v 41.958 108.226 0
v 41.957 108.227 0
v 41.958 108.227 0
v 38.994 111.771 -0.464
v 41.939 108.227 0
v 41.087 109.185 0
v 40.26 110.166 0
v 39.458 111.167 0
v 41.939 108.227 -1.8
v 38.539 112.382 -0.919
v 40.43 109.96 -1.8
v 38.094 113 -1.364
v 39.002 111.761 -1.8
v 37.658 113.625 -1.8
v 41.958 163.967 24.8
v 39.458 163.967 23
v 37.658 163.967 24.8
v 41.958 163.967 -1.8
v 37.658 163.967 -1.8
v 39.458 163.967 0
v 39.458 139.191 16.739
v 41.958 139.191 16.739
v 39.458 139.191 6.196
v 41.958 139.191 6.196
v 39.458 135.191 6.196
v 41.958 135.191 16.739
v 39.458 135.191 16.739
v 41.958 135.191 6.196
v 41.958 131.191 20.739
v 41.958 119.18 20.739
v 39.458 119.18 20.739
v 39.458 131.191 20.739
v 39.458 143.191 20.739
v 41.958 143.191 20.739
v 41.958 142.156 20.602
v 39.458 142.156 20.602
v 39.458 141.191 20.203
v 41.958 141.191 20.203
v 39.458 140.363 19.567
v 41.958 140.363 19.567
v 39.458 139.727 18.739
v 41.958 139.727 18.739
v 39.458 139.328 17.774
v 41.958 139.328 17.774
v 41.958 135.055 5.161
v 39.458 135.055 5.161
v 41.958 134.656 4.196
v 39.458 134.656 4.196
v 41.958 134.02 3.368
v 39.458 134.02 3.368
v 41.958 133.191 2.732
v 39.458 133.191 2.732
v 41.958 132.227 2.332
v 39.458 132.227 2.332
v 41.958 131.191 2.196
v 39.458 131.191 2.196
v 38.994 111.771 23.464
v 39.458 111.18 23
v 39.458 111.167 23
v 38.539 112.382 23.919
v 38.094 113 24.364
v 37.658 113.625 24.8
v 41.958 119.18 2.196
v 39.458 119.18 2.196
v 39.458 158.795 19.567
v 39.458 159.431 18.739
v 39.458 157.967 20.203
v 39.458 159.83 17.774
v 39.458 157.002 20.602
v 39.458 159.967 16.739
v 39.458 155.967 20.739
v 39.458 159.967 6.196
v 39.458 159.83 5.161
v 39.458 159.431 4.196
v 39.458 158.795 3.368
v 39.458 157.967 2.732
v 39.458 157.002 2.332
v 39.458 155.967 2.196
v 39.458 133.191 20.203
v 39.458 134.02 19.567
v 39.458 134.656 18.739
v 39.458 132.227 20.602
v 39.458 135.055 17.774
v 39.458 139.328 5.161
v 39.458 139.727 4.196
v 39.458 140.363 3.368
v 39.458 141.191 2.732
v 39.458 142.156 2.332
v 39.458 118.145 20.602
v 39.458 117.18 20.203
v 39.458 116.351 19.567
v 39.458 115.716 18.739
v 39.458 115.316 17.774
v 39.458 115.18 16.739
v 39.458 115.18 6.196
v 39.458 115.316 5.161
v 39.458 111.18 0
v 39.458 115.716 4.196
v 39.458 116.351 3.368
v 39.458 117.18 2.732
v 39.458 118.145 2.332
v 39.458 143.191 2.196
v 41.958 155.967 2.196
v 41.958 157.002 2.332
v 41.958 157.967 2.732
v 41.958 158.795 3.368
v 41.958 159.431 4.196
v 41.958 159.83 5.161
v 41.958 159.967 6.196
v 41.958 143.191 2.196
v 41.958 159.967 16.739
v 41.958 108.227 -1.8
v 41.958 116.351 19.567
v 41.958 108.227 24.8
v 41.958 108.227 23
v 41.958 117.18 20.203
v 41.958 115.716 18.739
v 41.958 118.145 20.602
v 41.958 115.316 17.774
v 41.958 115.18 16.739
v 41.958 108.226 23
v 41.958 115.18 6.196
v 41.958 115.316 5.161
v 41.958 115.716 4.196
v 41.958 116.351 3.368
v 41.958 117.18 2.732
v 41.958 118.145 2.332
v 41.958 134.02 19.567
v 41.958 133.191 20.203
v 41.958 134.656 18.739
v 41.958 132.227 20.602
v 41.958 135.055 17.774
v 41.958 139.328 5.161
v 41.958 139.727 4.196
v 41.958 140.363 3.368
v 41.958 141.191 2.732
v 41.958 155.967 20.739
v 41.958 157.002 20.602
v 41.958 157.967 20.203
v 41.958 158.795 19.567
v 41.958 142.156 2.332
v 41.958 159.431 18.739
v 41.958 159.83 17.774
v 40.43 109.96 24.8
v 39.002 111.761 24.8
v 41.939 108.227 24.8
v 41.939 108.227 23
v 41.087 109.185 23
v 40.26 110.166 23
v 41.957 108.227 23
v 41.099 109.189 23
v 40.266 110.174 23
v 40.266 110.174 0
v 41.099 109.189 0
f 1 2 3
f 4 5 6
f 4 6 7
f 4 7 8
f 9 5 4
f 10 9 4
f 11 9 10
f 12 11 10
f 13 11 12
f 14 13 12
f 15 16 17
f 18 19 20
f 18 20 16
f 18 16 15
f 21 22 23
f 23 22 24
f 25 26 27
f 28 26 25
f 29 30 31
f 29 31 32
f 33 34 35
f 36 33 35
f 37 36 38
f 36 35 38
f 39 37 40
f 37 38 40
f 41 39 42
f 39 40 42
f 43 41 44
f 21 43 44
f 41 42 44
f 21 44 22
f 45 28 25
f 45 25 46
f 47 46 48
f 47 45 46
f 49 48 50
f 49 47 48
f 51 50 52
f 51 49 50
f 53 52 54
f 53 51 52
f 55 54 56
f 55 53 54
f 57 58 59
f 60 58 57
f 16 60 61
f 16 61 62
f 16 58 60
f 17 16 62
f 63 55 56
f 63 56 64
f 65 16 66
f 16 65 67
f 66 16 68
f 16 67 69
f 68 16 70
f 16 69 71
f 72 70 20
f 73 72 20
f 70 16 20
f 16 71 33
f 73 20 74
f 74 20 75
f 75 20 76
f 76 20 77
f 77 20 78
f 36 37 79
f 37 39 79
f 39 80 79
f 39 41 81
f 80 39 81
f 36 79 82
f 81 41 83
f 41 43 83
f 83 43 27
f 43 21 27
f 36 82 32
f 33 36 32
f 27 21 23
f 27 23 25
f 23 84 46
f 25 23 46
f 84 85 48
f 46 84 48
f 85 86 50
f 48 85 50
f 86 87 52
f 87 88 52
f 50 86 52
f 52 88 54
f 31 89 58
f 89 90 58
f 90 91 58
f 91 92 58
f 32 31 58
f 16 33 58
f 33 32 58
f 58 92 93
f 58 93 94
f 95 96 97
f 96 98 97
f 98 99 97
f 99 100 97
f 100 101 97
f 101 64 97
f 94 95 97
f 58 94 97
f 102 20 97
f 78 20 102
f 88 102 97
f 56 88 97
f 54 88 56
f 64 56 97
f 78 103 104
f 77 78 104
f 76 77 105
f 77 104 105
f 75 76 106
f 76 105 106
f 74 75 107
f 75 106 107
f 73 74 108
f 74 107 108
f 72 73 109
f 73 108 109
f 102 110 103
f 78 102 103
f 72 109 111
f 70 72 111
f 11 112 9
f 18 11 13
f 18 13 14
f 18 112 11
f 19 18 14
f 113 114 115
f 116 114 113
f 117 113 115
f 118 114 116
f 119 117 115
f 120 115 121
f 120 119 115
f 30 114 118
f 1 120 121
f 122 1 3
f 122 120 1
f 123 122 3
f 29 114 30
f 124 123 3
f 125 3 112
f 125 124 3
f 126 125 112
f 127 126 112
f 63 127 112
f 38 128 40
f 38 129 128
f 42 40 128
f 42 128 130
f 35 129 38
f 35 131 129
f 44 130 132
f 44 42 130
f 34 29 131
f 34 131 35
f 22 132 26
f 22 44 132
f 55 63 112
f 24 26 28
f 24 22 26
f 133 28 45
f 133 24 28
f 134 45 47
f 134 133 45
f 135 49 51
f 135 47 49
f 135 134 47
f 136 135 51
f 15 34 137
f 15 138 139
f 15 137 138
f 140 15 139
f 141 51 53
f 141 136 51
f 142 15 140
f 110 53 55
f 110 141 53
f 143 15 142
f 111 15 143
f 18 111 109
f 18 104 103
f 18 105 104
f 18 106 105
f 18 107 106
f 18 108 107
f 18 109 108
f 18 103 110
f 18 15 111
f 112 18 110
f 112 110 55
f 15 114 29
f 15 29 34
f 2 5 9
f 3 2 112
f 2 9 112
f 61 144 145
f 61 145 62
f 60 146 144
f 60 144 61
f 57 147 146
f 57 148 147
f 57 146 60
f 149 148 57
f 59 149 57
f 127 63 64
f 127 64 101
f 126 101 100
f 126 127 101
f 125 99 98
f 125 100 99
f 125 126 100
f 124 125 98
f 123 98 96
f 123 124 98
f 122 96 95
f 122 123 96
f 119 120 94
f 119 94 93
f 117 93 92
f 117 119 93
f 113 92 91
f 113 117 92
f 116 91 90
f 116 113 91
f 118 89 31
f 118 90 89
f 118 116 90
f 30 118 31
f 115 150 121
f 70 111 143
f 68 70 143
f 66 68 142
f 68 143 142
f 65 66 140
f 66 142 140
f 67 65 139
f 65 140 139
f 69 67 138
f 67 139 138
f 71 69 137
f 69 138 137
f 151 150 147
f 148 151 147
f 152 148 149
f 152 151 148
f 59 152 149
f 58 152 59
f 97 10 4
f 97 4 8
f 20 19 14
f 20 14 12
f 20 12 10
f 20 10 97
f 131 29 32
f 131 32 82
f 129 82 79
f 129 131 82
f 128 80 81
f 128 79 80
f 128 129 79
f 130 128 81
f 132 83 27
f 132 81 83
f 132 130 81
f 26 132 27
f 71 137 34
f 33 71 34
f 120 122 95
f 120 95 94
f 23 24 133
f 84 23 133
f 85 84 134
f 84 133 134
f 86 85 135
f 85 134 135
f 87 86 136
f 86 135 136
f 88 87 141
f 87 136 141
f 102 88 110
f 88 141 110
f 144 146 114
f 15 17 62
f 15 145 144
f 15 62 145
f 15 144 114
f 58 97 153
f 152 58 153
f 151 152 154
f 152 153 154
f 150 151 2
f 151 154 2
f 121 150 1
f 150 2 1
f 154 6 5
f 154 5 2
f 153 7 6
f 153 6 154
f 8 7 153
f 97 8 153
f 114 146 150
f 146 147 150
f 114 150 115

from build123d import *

# Parameters (mm, degrees)
BOSS_EXTRU_1_DEPTH           = 23
BOSS_EXTRU_2_DEPTH           = 55.74
ENL_V_MAT_EXTRU_2_DEPTH      = 166.850257131
ENL_V_MAT_EXTRU_2_DEPTH_BACK = 166.850257131
ENL_V_MAT_EXTRU_3_DEPTH      = 172.327320122
ENL_V_MAT_EXTRU_3_DEPTH_BACK = 172.327320122


with BuildPart() as part:
    # Esquisse1 → Boss.-Extru.1 (new body)
    with BuildSketch(Plane.XY):
        with BuildLine():
            Line((39.457988868, 163.966514235), (39.457988868, 111.179894524))
            ThreePointArc((39.457988868, 111.179894524), (40.679417093, 109.678629524), (41.957988868, 108.225722877))
            Line((41.957988868, 108.225722877), (41.957988868, 163.966514235))
            Line((41.957988868, 163.966514235), (39.457988868, 163.966514235))
        make_face()
    extrude(amount=BOSS_EXTRU_1_DEPTH)

    # Esquisse2 → Boss.-Extru.2 (add)
    with BuildSketch(Plane(origin=(0, 163.966514235, 0), x_dir=(1, 0, 0), z_dir=(0, 1, 0))):
        Polygon((41.957988868, 0), (41.957988868, 1.8), (37.657988868, 1.8), (39.457988868, 0), align=None)
        Polygon((41.957988868, -24.8), (41.957988868, -23), (39.457988868, -23), (37.657988868, -24.8), align=None)
    extrude(amount=-BOSS_EXTRU_2_DEPTH)

    # Esquisse4 → Enlèv. mat.-Extru.2 (cut, two sides: drawn at the far end of the back side and taken through both)
    with BuildSketch(Plane.ZY.offset(-39.457988868).offset(-ENL_V_MAT_EXTRU_2_DEPTH_BACK)):
        with BuildLine():
            Line((6.196124825, 159.966514235), (16.73866324, 159.966514235))
            ThreePointArc((16.73866324, 159.966514235), (19.567090365, 158.79494136), (20.73866324, 155.966514235))
            Line((20.73866324, 155.966514235), (20.73866324, 143.19142939))
            ThreePointArc((20.73866324, 143.19142939), (19.567090365, 140.363002265), (16.73866324, 139.19142939))
            Line((16.73866324, 139.19142939), (6.196124825, 139.19142939))
            ThreePointArc((6.196124825, 139.19142939), (3.367697701, 140.363002265), (2.196124825, 143.19142939))
            Line((2.196124825, 143.19142939), (2.196124825, 155.966514235))
            ThreePointArc((2.196124825, 155.966514235), (3.367697701, 158.79494136), (6.196124825, 159.966514235))
        make_face()
        with BuildLine():
            Line((16.73866324, 135.19142939), (6.196124825, 135.19142939))
            ThreePointArc((6.196124825, 135.19142939), (3.367697701, 134.019856515), (2.196124825, 131.19142939))
            Line((2.196124825, 131.19142939), (2.196124825, 119.179894524))
            ThreePointArc((2.196124825, 119.179894524), (3.367697701, 116.351467399), (6.196124825, 115.179894524))
            Line((6.196124825, 115.179894524), (16.73866324, 115.179894524))
            ThreePointArc((16.73866324, 115.179894524), (19.567090365, 116.351467399), (20.73866324, 119.179894524))
            Line((20.73866324, 119.179894524), (20.73866324, 131.19142939))
            ThreePointArc((20.73866324, 131.19142939), (19.567090365, 134.019856515), (16.73866324, 135.19142939))
        make_face()
    extrude(amount=ENL_V_MAT_EXTRU_2_DEPTH + ENL_V_MAT_EXTRU_2_DEPTH_BACK, mode=Mode.SUBTRACT)

    # Esquisse5 → Enlèv. mat.-Extru.3 (cut, two sides: drawn at the far end of the back side and taken through both)
    with BuildSketch(Plane.XY.offset(24.8).offset(-ENL_V_MAT_EXTRU_3_DEPTH_BACK)):
        with BuildLine():
            Line((35.834434648, 116.483137771), (36.387771846, 105.790873255))
            Line((36.387771846, 105.790873255), (45.050231908, 105.102432834))
            ThreePointArc((45.050231908, 105.102432834), (40.024403512, 110.454356706), (35.834434648, 116.483137771))
        make_face()
    extrude(amount=ENL_V_MAT_EXTRU_3_DEPTH + ENL_V_MAT_EXTRU_3_DEPTH_BACK, mode=Mode.SUBTRACT)


solid = part.part
